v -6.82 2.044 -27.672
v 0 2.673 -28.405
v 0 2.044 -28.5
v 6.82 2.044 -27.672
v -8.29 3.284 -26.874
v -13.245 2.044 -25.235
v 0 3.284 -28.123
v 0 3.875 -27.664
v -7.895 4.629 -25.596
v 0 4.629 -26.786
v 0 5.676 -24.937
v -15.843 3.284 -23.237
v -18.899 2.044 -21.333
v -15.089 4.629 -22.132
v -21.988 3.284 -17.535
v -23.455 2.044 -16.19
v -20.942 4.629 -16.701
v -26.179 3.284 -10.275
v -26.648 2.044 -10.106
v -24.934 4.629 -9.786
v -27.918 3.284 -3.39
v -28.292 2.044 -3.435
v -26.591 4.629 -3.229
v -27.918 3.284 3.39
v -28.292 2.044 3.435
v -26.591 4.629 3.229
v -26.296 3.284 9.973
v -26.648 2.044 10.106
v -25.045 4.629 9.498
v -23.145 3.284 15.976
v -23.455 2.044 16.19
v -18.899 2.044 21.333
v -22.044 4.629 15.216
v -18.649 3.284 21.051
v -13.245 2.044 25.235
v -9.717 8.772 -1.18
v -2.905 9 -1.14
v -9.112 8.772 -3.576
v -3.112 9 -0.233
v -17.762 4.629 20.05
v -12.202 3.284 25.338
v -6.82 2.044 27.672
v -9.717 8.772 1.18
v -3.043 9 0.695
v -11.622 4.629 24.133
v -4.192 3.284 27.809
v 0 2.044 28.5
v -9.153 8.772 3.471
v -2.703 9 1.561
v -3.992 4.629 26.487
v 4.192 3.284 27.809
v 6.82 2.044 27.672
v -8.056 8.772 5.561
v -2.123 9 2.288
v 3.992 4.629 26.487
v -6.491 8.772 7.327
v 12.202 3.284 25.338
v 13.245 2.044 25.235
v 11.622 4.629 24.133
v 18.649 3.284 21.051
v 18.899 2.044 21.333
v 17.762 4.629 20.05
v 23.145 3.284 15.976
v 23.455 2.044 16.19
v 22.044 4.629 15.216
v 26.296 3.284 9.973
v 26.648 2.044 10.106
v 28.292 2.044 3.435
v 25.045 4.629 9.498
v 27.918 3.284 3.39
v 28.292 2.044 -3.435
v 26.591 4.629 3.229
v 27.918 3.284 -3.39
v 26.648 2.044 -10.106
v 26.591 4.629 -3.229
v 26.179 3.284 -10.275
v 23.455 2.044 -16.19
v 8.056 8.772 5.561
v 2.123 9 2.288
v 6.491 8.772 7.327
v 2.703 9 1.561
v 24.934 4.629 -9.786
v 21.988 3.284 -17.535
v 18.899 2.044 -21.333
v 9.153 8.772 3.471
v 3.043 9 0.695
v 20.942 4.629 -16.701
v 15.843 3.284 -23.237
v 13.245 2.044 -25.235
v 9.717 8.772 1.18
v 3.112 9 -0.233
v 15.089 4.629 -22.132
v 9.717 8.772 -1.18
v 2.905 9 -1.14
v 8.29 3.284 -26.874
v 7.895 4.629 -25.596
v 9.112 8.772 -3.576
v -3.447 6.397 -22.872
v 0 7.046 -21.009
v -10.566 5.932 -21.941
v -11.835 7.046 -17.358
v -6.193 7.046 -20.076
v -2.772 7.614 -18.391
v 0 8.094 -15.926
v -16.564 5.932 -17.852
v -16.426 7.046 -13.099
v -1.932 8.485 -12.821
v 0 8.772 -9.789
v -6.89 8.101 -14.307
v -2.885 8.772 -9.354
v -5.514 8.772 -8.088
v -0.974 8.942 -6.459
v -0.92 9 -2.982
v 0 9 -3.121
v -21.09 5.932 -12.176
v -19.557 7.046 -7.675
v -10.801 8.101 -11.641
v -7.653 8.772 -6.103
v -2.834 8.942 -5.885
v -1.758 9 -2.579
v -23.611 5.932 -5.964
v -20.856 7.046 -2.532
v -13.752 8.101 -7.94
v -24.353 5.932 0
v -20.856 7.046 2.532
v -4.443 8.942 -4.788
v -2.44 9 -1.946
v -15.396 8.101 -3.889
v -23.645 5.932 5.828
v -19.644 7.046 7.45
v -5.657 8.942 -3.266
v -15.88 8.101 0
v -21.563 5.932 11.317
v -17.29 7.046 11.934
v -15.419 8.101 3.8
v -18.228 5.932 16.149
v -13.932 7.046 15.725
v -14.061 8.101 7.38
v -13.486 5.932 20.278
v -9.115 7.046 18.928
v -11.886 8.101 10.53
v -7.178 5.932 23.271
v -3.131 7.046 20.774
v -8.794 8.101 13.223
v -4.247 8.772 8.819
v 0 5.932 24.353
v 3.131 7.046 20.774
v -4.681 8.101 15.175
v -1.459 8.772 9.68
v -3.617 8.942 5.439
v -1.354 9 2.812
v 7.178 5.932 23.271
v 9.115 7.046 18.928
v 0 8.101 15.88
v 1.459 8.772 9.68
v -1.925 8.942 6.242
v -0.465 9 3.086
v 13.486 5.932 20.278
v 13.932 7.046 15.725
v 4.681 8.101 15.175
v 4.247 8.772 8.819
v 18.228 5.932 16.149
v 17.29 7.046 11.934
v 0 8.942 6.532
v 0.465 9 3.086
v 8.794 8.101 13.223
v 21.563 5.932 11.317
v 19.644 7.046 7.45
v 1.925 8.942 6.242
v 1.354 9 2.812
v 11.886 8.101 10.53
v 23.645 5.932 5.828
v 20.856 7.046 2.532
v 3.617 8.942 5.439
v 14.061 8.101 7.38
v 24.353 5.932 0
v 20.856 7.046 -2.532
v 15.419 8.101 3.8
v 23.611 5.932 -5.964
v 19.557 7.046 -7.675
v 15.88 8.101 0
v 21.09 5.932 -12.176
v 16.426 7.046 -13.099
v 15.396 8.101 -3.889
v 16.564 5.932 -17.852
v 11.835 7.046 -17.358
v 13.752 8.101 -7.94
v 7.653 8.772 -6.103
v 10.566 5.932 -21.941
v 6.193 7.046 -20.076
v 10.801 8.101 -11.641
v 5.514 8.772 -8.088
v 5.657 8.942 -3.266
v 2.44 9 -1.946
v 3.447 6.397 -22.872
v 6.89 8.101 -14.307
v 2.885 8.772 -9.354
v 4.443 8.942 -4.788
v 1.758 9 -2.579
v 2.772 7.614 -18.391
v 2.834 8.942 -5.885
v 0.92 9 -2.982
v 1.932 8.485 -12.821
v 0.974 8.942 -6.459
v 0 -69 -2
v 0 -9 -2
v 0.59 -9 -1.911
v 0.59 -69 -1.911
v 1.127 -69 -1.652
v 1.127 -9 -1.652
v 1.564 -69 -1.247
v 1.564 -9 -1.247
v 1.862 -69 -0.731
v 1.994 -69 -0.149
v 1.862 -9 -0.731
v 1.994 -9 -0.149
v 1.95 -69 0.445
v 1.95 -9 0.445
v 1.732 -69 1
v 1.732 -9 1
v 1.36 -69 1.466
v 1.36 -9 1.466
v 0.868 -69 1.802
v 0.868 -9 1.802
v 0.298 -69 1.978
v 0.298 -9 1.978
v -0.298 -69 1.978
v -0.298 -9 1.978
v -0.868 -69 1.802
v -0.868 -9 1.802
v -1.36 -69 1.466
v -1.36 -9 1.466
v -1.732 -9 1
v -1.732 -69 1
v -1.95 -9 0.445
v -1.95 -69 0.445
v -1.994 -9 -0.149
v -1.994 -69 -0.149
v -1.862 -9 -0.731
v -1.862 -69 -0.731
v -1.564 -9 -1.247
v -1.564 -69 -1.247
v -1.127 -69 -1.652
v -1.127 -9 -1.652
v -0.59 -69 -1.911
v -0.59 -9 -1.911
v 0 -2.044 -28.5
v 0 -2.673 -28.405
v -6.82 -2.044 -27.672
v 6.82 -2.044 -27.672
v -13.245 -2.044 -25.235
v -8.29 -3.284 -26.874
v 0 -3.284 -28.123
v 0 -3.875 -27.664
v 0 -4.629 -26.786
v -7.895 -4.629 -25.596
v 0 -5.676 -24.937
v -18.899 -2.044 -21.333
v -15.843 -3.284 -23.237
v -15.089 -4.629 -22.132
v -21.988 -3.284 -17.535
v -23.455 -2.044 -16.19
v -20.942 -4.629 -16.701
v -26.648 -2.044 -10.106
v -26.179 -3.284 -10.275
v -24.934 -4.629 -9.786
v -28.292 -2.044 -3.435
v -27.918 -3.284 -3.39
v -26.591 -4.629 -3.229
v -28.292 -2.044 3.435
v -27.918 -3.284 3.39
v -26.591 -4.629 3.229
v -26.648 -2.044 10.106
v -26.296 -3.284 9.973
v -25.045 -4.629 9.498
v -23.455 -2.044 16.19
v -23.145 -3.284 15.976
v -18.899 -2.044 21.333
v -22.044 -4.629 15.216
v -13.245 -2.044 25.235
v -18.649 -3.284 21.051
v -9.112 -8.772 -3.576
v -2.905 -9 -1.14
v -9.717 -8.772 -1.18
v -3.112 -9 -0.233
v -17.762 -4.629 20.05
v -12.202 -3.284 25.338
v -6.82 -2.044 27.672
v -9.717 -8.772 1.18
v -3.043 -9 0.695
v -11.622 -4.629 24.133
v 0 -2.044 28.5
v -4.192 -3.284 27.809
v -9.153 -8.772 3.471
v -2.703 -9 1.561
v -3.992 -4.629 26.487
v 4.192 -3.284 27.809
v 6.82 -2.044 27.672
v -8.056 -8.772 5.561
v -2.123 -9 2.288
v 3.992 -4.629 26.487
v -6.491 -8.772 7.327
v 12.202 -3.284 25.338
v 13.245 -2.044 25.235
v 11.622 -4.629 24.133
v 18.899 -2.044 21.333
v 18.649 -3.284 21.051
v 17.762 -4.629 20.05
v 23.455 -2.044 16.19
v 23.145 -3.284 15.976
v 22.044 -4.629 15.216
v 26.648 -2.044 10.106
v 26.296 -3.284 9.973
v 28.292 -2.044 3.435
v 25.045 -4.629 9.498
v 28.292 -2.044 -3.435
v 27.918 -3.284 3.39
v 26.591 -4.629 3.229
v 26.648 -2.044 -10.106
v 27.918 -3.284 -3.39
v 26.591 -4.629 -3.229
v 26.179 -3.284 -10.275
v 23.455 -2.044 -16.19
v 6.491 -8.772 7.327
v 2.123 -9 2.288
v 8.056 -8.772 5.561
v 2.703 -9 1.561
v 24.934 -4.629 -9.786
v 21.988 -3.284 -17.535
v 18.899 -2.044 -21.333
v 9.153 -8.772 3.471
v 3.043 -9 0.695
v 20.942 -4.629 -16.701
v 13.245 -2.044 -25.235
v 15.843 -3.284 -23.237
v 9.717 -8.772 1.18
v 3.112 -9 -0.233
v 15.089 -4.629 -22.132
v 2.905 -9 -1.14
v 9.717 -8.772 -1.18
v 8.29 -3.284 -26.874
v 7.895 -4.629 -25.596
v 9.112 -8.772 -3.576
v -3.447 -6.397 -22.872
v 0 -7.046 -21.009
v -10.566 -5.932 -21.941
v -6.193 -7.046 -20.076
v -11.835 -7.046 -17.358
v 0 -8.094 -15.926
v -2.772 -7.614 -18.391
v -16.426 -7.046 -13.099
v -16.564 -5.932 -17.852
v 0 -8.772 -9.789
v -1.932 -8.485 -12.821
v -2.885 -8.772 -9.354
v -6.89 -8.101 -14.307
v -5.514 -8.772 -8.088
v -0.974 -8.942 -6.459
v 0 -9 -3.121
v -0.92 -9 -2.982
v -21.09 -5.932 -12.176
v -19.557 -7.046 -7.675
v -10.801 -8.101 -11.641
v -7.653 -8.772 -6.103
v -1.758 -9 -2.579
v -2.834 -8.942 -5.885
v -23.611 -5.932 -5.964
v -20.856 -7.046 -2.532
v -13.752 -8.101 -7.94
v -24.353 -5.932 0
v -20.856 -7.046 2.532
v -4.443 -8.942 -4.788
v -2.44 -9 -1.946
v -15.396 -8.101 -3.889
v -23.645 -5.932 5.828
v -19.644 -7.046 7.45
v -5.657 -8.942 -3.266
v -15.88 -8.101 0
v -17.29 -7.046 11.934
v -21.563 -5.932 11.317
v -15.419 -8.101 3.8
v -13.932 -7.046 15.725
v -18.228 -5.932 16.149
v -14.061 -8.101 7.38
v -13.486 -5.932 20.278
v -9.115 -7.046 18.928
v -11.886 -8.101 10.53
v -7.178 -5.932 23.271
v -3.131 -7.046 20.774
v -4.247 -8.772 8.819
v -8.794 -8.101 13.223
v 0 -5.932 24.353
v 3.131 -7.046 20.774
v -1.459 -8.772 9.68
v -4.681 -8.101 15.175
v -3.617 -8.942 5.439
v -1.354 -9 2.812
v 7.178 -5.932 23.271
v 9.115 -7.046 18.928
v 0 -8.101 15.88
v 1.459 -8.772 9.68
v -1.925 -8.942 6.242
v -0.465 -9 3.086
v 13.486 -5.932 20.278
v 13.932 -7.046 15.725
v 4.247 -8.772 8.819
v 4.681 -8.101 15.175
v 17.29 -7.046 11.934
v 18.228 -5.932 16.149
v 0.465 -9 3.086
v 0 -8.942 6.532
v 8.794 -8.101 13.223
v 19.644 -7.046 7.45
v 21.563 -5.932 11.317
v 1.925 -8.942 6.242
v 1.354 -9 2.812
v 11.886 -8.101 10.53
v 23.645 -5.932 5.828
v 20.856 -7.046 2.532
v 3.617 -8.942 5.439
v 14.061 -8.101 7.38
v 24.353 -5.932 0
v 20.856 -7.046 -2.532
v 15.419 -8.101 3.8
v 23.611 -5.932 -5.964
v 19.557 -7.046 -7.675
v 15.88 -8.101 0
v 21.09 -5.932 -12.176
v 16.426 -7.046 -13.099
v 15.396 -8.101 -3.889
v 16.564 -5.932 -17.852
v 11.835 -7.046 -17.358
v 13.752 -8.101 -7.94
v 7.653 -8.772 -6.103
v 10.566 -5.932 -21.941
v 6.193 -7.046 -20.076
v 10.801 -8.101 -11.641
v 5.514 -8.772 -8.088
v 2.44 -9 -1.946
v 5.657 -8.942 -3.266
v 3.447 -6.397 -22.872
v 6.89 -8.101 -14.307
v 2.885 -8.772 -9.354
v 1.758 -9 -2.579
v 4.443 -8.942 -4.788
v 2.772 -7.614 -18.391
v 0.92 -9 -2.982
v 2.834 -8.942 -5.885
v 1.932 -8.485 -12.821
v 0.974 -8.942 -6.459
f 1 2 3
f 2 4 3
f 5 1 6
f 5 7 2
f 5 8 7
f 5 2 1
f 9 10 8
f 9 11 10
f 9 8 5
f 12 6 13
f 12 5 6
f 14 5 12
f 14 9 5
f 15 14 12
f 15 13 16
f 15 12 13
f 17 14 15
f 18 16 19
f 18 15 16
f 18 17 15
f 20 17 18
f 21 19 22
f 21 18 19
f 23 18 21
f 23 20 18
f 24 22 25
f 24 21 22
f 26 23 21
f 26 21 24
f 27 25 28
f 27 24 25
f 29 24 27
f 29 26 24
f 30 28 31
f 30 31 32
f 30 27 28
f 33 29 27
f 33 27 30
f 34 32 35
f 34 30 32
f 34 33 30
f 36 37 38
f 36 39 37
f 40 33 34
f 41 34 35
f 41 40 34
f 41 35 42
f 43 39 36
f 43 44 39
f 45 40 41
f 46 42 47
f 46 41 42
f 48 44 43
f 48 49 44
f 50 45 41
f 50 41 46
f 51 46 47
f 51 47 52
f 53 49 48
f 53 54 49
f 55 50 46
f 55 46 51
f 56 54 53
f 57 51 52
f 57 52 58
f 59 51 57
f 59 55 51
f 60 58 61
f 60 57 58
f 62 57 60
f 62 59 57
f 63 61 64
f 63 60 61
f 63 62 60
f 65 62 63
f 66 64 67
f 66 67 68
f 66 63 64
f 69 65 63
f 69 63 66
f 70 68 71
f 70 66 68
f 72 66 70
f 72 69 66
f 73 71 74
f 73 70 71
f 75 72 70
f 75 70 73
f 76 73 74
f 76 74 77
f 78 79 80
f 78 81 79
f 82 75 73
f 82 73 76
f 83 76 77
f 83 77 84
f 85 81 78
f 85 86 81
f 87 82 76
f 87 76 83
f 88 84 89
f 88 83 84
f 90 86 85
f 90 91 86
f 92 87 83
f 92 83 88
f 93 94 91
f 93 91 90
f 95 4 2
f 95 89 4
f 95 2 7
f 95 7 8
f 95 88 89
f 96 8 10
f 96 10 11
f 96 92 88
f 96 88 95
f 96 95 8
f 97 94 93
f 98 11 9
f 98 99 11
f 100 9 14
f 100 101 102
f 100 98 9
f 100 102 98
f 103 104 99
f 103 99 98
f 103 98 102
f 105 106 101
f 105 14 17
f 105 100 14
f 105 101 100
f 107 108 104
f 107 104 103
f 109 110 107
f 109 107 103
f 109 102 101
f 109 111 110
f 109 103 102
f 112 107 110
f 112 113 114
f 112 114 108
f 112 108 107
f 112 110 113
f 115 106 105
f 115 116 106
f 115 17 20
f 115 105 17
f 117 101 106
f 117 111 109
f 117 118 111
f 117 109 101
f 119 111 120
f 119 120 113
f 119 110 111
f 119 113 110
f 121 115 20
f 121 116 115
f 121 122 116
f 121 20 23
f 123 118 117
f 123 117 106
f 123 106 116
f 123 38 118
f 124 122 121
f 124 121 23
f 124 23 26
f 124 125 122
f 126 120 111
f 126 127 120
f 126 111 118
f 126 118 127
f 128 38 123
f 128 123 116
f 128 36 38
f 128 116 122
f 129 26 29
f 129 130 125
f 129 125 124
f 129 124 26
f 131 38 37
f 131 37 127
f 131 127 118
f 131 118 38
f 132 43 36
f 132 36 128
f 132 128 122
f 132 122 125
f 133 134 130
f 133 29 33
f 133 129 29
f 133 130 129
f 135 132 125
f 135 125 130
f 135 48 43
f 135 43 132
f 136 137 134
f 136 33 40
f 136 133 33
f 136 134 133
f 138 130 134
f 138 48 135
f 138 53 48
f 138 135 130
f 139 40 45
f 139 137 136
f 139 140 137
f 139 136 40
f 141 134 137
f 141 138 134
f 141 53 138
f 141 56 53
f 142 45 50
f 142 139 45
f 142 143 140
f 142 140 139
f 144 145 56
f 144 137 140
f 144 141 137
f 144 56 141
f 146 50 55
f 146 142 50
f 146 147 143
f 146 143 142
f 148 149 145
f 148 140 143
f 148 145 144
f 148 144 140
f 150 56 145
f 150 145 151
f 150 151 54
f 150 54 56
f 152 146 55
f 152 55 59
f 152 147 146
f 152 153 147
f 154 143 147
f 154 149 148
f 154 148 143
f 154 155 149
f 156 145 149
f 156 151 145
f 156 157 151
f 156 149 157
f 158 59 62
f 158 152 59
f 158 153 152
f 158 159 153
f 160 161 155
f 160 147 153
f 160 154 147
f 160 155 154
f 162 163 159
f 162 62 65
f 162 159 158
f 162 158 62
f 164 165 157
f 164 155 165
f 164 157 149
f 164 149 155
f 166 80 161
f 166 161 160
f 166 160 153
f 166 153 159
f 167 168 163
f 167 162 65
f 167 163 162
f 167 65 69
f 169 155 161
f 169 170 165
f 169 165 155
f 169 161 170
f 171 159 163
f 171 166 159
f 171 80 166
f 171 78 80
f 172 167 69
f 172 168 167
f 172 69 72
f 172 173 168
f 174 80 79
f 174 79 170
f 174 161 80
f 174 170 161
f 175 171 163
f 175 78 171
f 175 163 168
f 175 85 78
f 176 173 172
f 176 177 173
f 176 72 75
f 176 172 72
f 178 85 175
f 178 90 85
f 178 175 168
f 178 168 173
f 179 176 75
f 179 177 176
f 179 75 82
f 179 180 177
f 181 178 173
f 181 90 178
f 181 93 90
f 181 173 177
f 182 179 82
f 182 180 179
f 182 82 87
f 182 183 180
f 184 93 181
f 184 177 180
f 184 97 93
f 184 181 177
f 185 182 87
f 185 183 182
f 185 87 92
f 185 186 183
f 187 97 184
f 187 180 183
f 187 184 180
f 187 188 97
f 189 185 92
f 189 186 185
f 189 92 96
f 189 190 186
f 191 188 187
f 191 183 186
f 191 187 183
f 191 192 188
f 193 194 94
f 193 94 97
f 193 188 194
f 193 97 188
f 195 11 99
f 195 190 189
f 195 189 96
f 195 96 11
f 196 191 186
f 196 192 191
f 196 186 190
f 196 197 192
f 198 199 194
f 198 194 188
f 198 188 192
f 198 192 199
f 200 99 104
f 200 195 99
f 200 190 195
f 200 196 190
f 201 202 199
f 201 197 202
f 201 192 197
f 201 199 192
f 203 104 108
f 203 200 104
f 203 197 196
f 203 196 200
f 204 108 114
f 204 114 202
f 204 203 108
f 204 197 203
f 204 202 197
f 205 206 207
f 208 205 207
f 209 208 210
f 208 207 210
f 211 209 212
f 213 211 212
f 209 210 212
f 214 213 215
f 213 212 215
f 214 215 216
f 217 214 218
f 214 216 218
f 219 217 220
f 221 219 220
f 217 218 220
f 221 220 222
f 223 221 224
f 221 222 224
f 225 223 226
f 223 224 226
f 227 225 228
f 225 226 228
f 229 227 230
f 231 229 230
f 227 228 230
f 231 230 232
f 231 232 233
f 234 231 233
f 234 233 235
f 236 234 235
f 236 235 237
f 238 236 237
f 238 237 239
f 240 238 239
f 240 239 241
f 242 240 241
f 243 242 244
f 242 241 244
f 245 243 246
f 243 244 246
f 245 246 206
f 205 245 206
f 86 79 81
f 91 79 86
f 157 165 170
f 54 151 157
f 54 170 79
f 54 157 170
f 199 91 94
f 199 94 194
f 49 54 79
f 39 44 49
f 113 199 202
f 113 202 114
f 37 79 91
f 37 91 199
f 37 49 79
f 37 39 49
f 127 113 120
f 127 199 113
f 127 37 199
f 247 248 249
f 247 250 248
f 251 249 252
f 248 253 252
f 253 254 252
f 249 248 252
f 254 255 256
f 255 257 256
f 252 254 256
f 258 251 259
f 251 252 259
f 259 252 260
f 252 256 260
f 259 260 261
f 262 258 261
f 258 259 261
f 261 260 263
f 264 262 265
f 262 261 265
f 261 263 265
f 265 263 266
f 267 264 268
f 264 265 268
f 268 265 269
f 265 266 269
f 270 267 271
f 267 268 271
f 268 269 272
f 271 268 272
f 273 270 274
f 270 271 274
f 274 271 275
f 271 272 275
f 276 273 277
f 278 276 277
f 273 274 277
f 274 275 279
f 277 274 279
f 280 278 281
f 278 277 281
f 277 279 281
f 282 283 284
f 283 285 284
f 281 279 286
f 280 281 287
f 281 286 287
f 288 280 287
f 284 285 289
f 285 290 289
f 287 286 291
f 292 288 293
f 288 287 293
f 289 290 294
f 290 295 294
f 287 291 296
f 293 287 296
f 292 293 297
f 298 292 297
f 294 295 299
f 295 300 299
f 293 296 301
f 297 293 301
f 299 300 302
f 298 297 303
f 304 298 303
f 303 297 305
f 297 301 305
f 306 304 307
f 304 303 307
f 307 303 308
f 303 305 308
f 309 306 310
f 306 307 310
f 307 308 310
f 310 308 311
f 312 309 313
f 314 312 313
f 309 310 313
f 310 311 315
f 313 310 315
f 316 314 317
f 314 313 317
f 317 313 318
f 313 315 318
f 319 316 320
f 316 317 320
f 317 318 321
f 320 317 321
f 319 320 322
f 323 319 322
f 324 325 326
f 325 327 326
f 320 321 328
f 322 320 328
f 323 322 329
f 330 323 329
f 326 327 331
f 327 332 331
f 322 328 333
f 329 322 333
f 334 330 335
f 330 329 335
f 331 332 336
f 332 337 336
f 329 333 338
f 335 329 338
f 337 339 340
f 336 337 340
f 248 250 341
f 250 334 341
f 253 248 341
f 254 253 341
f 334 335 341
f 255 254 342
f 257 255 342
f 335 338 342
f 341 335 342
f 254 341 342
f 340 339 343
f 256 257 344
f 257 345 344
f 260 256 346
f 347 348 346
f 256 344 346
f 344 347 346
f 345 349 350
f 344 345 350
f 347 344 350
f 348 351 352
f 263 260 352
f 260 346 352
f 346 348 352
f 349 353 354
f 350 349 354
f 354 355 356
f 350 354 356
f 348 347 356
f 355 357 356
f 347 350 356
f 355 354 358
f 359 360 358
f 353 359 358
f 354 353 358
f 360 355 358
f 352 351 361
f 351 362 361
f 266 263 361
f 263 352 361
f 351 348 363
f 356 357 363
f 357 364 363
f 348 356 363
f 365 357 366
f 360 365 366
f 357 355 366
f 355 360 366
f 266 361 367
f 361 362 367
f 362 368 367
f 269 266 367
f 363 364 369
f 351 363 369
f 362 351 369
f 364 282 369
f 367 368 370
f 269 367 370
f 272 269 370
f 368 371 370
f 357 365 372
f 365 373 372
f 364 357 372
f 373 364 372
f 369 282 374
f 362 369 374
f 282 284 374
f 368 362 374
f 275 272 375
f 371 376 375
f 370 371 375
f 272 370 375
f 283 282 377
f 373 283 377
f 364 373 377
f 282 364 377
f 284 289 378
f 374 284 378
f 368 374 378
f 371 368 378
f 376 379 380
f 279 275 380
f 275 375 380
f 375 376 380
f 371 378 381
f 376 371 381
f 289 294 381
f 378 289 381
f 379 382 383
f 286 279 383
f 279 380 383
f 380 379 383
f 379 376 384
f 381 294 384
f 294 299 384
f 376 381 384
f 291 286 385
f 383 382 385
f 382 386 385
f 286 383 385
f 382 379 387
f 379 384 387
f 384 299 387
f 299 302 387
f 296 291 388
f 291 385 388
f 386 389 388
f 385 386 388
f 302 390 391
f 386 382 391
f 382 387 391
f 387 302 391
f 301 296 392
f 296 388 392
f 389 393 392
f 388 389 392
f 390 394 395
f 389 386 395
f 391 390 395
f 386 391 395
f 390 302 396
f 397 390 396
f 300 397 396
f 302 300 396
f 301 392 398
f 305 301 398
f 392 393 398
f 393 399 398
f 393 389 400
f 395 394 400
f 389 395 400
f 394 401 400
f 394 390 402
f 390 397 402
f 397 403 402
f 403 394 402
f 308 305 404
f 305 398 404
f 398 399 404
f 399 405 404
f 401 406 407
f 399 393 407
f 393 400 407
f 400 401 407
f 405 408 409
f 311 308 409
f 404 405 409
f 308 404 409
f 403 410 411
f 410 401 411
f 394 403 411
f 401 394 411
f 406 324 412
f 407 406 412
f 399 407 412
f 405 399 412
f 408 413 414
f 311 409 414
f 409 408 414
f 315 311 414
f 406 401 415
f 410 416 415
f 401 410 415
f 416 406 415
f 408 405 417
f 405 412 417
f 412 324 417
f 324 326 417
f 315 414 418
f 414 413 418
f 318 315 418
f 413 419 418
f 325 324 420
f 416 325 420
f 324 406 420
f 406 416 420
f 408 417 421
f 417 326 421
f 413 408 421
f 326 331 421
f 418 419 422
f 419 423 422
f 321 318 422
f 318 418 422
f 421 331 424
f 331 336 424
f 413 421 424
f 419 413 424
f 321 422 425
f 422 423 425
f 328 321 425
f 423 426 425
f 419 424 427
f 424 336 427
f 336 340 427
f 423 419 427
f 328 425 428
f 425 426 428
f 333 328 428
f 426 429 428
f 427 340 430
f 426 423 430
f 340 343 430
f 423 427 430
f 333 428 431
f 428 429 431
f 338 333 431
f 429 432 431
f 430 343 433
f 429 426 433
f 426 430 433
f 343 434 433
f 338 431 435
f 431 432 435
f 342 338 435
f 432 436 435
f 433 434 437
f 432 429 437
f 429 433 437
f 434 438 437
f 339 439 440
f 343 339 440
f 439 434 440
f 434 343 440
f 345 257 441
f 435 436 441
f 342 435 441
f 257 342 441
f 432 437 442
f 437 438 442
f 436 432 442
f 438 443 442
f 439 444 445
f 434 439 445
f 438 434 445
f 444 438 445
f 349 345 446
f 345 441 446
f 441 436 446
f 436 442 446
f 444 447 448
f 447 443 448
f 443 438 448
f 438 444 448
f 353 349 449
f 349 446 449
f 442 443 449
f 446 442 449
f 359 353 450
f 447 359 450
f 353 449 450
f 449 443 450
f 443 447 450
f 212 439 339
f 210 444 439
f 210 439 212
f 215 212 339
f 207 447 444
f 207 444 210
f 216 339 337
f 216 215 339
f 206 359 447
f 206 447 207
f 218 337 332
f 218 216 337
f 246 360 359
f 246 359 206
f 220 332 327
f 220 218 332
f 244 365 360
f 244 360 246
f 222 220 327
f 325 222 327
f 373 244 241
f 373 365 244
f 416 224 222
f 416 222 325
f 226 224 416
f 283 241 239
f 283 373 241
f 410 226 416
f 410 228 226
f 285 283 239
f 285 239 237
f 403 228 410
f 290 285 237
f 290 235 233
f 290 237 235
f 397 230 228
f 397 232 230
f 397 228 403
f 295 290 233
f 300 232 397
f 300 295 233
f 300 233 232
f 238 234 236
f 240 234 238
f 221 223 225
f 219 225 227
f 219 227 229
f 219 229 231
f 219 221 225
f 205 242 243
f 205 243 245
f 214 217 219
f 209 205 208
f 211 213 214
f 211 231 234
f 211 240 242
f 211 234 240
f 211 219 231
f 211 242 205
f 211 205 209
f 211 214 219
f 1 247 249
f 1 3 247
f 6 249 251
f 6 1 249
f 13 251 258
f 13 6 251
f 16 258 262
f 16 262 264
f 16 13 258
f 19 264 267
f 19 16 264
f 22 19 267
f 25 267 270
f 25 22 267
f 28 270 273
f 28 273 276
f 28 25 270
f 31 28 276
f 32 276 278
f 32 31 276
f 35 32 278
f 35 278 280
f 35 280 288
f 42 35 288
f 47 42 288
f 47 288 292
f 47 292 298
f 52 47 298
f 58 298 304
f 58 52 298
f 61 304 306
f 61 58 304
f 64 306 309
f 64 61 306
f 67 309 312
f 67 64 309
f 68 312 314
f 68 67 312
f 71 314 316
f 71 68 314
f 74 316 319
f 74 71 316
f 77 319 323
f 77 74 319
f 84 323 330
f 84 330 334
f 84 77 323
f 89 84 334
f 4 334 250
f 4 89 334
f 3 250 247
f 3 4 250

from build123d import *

# Parameters (mm, degrees)
SKETCH8_R           = 2
BOSS_EXTRUDE3_DEPTH = 60


with BuildPart() as part:
    # Sketch7 → Revolve2 (revolve)
    with BuildSketch(Plane.XY, mode=Mode.PRIVATE) as revolve2_sk:
        with BuildLine():
            Line((28.5, -2.04421243), (28.5, 2.04421243))
            add(Edge.make_bspline(
                [(28.5, 2.04421243), (28.5, 5.980056208), (17.452650763, 9), (3.121109552, 9)],
                knots=[0, 0, 0, 0, 1, 1, 1, 1], degree=3))
            Line((3.121109552, 9), (0, 9))
            Line((0, 9), (0, -9))
            Line((0, -9), (3.121109552, -9))
            add(Edge.make_bspline(
                [(28.5, -2.04421243), (28.5, -5.980056208), (17.452650763, -9), (3.121109552, -9)],
                knots=[0, 0, 0, 0, 1, 1, 1, 1], degree=3))
        make_face()
    revolve(revolve2_sk.sketch.rotate(Axis((0, 0, 0), (0, 1, 0)), 90), axis=Axis((0, 0, 0), (0, 1, 0)))

    # Sketch8 → Boss-Extrude3 (add)
    with BuildSketch(Plane.XZ.offset(9)):
        with Locations(Location((0, 0, 0), (0, 0, 270))):
            Circle(SKETCH8_R)
    extrude(amount=BOSS_EXTRUDE3_DEPTH)


solid = part.part
